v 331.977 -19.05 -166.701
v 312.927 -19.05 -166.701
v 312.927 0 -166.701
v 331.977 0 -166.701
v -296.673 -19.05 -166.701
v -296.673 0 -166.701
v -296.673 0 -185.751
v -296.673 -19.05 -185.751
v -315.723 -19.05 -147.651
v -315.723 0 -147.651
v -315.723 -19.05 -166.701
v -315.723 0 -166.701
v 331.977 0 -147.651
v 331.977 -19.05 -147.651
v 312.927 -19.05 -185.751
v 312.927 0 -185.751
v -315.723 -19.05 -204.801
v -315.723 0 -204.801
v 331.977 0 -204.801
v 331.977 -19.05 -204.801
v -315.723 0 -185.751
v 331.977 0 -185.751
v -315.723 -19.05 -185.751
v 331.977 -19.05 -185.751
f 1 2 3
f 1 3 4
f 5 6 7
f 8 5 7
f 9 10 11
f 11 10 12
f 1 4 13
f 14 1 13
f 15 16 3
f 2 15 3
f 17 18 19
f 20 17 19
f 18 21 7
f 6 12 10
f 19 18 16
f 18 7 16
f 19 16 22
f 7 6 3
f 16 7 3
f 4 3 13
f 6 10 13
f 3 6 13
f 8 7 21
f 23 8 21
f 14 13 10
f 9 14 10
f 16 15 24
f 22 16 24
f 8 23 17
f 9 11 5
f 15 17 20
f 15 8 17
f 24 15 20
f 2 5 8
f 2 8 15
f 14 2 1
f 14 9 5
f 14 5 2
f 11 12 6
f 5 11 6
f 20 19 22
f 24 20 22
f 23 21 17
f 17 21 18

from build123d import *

# Parameters (mm, degrees)
F0_W     = 19.05
F0_H     = 19.05
F1_DEPTH = 19.05


# Not quite as in the source:
# - a feature names something its author has since deleted; it is built from what else it names


with BuildPart() as f1:
    # F0 (on Front) → F1 (new body)
    with BuildSketch(Plane.XZ):
        Polygon((312.9268772483, -147.6505908728), (-296.6731227517, -147.6505908728), (-315.7231227517, -147.6505908728), (-315.7231227517, -166.7005908728), (-296.6731227517, -166.7005908728), (-296.6731227517, -185.7505908728), (-315.7231227517, -185.7505908728), (-315.7231227517, -204.8005908728), (-296.6731227517, -204.8005908728), (312.9268772483, -204.8005908728), (312.9268772483, -185.7505908728), (312.9268772483, -166.7005908728), align=None)
        with Locations((322.4518772483, -157.1755908728)):
            Rectangle(F0_W, F0_H)
        with Locations((322.4518772483, -195.2755908728)):
            Rectangle(F0_W, F0_H)
    extrude(amount=F1_DEPTH)


solid = f1.part
